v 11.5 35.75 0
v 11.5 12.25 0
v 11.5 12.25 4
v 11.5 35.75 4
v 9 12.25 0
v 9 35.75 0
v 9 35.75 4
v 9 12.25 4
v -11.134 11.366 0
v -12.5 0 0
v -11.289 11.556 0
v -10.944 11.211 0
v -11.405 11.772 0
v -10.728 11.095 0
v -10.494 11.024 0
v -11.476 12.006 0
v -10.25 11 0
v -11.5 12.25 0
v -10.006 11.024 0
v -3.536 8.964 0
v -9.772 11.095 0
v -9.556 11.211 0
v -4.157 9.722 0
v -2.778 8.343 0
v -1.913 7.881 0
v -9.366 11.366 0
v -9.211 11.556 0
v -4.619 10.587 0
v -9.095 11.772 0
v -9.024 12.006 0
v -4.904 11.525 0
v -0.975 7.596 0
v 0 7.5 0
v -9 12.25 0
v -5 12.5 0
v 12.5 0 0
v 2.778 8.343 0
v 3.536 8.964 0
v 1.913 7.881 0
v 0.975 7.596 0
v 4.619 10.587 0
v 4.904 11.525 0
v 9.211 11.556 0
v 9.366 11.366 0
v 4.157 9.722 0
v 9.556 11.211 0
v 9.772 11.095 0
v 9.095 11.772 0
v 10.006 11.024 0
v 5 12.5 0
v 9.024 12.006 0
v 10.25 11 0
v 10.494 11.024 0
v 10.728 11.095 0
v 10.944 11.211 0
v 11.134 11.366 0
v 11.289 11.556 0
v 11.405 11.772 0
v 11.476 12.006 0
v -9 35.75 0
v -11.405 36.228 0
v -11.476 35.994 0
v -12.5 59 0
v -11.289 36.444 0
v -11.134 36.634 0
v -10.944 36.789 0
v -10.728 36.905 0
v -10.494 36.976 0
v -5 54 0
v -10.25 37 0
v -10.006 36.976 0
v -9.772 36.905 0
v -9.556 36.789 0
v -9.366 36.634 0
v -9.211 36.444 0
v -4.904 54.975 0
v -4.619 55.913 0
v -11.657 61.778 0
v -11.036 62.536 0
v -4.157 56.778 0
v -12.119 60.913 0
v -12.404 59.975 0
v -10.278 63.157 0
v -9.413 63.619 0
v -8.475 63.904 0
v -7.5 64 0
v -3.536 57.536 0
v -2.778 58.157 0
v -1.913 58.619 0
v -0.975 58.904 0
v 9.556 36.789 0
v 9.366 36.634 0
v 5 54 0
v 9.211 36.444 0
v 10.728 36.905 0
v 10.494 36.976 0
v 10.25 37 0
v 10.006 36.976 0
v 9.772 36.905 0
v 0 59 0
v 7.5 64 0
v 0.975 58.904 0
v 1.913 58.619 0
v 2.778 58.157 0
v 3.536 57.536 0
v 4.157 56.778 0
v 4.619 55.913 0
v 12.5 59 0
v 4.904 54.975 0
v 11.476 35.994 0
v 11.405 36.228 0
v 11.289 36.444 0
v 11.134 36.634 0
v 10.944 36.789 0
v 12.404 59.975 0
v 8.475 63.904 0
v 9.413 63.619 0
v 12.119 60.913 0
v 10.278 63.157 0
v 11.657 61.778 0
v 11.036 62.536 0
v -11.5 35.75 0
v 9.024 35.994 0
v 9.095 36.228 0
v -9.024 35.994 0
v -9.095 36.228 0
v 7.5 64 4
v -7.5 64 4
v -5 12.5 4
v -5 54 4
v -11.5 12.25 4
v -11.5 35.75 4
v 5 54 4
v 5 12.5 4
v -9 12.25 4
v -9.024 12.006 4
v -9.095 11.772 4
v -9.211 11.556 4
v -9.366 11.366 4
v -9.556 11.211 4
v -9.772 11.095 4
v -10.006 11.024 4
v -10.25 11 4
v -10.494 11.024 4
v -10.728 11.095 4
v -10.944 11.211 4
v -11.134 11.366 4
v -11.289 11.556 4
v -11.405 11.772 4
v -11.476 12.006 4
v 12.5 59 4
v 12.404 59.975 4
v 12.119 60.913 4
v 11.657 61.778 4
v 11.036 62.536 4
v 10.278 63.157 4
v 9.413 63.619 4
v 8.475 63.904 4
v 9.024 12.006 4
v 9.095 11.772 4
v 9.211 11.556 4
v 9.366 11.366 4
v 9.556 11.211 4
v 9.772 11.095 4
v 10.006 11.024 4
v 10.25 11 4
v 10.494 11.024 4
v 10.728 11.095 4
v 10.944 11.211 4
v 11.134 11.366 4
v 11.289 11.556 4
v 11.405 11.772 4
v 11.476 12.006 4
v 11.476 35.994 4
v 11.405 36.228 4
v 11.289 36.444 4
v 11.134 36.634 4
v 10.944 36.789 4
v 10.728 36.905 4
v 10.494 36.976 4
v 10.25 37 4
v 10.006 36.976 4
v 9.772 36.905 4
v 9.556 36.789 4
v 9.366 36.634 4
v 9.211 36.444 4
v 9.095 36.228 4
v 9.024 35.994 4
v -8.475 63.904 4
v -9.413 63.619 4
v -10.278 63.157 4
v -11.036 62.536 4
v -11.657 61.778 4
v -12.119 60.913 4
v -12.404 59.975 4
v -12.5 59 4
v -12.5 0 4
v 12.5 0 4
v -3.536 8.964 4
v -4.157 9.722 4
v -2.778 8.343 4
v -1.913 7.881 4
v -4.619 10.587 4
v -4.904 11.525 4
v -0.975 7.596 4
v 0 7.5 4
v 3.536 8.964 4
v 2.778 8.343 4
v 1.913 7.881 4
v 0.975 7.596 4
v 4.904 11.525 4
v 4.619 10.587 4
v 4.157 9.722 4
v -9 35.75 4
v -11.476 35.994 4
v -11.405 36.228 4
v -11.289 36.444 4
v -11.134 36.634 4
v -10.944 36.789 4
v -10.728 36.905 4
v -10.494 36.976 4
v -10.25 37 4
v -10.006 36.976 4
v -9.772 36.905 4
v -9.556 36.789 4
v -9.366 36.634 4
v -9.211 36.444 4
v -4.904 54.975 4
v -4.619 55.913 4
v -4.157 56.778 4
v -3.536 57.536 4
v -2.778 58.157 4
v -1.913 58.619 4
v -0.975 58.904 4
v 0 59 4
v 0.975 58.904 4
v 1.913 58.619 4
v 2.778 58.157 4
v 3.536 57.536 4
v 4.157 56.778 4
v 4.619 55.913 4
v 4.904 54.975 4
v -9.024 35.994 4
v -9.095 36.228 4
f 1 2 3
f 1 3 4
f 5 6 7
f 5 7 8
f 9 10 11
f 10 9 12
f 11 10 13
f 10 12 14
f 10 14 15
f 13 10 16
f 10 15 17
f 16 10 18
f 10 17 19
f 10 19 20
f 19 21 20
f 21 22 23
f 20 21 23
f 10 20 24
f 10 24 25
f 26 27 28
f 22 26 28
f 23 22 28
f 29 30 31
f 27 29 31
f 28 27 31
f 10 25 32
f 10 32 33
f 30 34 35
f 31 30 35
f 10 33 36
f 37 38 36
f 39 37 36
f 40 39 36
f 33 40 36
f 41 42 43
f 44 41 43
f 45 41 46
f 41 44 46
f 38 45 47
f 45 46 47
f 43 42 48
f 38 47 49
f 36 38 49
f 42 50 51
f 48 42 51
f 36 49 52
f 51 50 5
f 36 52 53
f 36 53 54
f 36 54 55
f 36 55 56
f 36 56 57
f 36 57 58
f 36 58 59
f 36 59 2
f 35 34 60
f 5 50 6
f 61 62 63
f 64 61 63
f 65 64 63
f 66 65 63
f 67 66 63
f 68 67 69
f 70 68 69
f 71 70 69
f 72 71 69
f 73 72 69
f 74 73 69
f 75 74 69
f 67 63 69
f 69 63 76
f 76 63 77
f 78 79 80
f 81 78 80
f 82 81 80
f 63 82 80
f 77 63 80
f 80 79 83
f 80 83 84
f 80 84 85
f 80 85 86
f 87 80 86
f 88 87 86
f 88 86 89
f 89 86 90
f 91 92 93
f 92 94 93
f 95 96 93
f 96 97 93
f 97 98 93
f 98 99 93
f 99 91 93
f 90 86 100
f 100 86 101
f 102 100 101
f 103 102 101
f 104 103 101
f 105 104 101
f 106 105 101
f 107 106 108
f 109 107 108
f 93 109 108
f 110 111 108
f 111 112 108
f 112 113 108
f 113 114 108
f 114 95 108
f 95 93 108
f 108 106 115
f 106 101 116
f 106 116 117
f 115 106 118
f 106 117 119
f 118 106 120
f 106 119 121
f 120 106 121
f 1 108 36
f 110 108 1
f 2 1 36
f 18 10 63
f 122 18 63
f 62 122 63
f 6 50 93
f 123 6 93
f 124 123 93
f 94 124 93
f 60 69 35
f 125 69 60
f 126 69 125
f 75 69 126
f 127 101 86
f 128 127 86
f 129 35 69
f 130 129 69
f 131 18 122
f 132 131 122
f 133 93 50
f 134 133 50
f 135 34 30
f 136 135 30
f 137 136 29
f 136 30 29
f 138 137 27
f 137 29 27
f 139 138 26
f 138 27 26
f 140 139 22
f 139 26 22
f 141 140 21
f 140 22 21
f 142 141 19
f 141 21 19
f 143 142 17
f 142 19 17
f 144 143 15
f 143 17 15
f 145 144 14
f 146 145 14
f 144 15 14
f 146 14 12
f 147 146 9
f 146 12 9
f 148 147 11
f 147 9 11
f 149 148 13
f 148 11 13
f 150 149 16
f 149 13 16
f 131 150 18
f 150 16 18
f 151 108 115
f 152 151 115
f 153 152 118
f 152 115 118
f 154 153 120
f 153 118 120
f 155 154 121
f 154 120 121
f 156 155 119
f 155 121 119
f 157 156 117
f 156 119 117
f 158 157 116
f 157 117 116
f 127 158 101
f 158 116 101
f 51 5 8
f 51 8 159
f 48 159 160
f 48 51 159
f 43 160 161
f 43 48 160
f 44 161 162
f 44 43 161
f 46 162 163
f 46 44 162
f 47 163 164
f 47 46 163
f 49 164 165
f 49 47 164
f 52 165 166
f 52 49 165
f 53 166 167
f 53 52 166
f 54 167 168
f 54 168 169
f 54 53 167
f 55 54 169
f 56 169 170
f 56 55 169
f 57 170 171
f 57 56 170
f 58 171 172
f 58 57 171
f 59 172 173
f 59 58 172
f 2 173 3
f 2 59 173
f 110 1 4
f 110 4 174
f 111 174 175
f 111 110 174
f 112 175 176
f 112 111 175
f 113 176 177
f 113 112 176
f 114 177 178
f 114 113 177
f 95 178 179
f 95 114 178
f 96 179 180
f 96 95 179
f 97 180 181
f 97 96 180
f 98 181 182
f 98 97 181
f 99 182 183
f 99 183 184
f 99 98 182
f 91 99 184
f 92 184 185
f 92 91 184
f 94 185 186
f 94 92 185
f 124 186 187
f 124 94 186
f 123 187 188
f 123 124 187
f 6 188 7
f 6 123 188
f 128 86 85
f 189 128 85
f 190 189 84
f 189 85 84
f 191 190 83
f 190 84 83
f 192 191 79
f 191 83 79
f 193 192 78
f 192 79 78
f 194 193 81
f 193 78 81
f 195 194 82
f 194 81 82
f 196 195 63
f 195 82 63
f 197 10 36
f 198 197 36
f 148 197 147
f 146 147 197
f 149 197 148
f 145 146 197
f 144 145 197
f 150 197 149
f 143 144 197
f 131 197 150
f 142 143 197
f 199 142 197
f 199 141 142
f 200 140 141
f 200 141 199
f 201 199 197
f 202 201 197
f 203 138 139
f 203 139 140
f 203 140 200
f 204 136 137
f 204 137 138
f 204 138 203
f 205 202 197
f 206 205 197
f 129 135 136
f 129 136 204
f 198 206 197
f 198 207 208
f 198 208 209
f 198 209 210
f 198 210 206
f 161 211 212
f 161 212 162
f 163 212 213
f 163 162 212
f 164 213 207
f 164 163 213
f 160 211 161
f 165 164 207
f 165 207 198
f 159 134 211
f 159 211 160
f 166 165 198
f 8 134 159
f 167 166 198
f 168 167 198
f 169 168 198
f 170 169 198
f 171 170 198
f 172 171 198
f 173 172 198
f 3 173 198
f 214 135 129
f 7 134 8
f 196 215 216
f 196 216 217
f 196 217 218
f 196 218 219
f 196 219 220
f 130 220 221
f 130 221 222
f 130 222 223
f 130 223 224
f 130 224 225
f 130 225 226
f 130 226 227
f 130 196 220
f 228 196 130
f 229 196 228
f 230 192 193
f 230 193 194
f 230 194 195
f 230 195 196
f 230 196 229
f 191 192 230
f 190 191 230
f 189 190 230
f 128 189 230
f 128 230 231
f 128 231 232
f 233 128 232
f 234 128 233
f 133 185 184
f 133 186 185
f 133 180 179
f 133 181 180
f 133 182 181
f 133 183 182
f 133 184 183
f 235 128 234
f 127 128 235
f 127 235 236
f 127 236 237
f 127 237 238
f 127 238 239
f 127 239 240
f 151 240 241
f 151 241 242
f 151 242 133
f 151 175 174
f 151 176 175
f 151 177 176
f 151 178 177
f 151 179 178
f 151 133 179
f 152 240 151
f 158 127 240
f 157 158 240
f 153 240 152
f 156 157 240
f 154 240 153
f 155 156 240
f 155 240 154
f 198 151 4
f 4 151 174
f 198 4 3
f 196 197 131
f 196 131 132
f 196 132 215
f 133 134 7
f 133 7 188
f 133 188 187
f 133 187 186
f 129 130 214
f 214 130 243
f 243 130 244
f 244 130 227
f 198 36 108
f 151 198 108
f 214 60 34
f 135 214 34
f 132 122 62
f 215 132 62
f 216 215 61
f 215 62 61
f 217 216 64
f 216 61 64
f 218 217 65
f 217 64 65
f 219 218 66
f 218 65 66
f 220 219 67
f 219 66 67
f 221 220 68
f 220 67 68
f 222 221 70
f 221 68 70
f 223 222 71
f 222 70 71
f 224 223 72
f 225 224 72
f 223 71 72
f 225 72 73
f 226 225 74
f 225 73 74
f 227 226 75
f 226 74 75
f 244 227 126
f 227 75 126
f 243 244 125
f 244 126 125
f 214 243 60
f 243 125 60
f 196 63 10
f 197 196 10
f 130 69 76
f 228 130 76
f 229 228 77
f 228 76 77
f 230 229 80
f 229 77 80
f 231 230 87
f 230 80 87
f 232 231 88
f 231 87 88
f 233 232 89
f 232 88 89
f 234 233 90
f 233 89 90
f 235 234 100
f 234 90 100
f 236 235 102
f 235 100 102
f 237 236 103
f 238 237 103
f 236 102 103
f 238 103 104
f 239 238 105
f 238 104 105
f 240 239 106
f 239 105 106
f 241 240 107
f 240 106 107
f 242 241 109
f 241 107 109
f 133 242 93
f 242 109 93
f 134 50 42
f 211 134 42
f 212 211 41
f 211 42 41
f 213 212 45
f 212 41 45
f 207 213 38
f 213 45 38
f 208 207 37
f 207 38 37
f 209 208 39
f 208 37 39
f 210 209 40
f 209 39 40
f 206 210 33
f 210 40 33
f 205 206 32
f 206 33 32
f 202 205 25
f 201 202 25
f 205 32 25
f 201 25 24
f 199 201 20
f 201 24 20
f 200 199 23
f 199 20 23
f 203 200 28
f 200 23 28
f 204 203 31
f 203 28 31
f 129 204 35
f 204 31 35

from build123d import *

# Parameters (mm, degrees)
DODANIE_WYCI_GNI_CIE1_DEPTH = 4


with BuildPart() as part:
    # Szkic1 → Dodanie-wyciągnięcie1 (new body)
    with BuildSketch(Plane.XY):
        with BuildLine():
            Line((-12.5, 0), (12.5, 0))
            Line((12.5, 0), (12.5, 59))
            ThreePointArc((12.5, 59), (11.035533906, 62.535533906), (7.5, 64))
            Line((7.5, 64), (-7.5, 64))
            ThreePointArc((-7.5, 64), (-11.035533906, 62.535533906), (-12.5, 59))
            Line((-12.5, 59), (-12.5, 0))
        make_face()
        with BuildLine():
            Line((5, 54), (5, 12.5))
            ThreePointArc((5, 12.5), (0, 7.5), (-5, 12.5))
            Line((-5, 12.5), (-5, 54))
            ThreePointArc((-5, 54), (0, 59), (5, 54))
        make_face(mode=Mode.SUBTRACT)
        with BuildLine():
            Line((-9, 35.75), (-9, 12.25))
            ThreePointArc((-9, 12.25), (-10.25, 11), (-11.5, 12.25))
            Line((-11.5, 12.25), (-11.5, 35.75))
            ThreePointArc((-11.5, 35.75), (-10.25, 37), (-9, 35.75))
        make_face(mode=Mode.SUBTRACT)
        with BuildLine():
            Line((9, 35.75), (9, 12.25))
            ThreePointArc((9, 12.25), (10.25, 11), (11.5, 12.25))
            Line((11.5, 12.25), (11.5, 35.75))
            ThreePointArc((11.5, 35.75), (10.25, 37), (9, 35.75))
        make_face(mode=Mode.SUBTRACT)
    extrude(amount=DODANIE_WYCI_GNI_CIE1_DEPTH)


solid = part.part
